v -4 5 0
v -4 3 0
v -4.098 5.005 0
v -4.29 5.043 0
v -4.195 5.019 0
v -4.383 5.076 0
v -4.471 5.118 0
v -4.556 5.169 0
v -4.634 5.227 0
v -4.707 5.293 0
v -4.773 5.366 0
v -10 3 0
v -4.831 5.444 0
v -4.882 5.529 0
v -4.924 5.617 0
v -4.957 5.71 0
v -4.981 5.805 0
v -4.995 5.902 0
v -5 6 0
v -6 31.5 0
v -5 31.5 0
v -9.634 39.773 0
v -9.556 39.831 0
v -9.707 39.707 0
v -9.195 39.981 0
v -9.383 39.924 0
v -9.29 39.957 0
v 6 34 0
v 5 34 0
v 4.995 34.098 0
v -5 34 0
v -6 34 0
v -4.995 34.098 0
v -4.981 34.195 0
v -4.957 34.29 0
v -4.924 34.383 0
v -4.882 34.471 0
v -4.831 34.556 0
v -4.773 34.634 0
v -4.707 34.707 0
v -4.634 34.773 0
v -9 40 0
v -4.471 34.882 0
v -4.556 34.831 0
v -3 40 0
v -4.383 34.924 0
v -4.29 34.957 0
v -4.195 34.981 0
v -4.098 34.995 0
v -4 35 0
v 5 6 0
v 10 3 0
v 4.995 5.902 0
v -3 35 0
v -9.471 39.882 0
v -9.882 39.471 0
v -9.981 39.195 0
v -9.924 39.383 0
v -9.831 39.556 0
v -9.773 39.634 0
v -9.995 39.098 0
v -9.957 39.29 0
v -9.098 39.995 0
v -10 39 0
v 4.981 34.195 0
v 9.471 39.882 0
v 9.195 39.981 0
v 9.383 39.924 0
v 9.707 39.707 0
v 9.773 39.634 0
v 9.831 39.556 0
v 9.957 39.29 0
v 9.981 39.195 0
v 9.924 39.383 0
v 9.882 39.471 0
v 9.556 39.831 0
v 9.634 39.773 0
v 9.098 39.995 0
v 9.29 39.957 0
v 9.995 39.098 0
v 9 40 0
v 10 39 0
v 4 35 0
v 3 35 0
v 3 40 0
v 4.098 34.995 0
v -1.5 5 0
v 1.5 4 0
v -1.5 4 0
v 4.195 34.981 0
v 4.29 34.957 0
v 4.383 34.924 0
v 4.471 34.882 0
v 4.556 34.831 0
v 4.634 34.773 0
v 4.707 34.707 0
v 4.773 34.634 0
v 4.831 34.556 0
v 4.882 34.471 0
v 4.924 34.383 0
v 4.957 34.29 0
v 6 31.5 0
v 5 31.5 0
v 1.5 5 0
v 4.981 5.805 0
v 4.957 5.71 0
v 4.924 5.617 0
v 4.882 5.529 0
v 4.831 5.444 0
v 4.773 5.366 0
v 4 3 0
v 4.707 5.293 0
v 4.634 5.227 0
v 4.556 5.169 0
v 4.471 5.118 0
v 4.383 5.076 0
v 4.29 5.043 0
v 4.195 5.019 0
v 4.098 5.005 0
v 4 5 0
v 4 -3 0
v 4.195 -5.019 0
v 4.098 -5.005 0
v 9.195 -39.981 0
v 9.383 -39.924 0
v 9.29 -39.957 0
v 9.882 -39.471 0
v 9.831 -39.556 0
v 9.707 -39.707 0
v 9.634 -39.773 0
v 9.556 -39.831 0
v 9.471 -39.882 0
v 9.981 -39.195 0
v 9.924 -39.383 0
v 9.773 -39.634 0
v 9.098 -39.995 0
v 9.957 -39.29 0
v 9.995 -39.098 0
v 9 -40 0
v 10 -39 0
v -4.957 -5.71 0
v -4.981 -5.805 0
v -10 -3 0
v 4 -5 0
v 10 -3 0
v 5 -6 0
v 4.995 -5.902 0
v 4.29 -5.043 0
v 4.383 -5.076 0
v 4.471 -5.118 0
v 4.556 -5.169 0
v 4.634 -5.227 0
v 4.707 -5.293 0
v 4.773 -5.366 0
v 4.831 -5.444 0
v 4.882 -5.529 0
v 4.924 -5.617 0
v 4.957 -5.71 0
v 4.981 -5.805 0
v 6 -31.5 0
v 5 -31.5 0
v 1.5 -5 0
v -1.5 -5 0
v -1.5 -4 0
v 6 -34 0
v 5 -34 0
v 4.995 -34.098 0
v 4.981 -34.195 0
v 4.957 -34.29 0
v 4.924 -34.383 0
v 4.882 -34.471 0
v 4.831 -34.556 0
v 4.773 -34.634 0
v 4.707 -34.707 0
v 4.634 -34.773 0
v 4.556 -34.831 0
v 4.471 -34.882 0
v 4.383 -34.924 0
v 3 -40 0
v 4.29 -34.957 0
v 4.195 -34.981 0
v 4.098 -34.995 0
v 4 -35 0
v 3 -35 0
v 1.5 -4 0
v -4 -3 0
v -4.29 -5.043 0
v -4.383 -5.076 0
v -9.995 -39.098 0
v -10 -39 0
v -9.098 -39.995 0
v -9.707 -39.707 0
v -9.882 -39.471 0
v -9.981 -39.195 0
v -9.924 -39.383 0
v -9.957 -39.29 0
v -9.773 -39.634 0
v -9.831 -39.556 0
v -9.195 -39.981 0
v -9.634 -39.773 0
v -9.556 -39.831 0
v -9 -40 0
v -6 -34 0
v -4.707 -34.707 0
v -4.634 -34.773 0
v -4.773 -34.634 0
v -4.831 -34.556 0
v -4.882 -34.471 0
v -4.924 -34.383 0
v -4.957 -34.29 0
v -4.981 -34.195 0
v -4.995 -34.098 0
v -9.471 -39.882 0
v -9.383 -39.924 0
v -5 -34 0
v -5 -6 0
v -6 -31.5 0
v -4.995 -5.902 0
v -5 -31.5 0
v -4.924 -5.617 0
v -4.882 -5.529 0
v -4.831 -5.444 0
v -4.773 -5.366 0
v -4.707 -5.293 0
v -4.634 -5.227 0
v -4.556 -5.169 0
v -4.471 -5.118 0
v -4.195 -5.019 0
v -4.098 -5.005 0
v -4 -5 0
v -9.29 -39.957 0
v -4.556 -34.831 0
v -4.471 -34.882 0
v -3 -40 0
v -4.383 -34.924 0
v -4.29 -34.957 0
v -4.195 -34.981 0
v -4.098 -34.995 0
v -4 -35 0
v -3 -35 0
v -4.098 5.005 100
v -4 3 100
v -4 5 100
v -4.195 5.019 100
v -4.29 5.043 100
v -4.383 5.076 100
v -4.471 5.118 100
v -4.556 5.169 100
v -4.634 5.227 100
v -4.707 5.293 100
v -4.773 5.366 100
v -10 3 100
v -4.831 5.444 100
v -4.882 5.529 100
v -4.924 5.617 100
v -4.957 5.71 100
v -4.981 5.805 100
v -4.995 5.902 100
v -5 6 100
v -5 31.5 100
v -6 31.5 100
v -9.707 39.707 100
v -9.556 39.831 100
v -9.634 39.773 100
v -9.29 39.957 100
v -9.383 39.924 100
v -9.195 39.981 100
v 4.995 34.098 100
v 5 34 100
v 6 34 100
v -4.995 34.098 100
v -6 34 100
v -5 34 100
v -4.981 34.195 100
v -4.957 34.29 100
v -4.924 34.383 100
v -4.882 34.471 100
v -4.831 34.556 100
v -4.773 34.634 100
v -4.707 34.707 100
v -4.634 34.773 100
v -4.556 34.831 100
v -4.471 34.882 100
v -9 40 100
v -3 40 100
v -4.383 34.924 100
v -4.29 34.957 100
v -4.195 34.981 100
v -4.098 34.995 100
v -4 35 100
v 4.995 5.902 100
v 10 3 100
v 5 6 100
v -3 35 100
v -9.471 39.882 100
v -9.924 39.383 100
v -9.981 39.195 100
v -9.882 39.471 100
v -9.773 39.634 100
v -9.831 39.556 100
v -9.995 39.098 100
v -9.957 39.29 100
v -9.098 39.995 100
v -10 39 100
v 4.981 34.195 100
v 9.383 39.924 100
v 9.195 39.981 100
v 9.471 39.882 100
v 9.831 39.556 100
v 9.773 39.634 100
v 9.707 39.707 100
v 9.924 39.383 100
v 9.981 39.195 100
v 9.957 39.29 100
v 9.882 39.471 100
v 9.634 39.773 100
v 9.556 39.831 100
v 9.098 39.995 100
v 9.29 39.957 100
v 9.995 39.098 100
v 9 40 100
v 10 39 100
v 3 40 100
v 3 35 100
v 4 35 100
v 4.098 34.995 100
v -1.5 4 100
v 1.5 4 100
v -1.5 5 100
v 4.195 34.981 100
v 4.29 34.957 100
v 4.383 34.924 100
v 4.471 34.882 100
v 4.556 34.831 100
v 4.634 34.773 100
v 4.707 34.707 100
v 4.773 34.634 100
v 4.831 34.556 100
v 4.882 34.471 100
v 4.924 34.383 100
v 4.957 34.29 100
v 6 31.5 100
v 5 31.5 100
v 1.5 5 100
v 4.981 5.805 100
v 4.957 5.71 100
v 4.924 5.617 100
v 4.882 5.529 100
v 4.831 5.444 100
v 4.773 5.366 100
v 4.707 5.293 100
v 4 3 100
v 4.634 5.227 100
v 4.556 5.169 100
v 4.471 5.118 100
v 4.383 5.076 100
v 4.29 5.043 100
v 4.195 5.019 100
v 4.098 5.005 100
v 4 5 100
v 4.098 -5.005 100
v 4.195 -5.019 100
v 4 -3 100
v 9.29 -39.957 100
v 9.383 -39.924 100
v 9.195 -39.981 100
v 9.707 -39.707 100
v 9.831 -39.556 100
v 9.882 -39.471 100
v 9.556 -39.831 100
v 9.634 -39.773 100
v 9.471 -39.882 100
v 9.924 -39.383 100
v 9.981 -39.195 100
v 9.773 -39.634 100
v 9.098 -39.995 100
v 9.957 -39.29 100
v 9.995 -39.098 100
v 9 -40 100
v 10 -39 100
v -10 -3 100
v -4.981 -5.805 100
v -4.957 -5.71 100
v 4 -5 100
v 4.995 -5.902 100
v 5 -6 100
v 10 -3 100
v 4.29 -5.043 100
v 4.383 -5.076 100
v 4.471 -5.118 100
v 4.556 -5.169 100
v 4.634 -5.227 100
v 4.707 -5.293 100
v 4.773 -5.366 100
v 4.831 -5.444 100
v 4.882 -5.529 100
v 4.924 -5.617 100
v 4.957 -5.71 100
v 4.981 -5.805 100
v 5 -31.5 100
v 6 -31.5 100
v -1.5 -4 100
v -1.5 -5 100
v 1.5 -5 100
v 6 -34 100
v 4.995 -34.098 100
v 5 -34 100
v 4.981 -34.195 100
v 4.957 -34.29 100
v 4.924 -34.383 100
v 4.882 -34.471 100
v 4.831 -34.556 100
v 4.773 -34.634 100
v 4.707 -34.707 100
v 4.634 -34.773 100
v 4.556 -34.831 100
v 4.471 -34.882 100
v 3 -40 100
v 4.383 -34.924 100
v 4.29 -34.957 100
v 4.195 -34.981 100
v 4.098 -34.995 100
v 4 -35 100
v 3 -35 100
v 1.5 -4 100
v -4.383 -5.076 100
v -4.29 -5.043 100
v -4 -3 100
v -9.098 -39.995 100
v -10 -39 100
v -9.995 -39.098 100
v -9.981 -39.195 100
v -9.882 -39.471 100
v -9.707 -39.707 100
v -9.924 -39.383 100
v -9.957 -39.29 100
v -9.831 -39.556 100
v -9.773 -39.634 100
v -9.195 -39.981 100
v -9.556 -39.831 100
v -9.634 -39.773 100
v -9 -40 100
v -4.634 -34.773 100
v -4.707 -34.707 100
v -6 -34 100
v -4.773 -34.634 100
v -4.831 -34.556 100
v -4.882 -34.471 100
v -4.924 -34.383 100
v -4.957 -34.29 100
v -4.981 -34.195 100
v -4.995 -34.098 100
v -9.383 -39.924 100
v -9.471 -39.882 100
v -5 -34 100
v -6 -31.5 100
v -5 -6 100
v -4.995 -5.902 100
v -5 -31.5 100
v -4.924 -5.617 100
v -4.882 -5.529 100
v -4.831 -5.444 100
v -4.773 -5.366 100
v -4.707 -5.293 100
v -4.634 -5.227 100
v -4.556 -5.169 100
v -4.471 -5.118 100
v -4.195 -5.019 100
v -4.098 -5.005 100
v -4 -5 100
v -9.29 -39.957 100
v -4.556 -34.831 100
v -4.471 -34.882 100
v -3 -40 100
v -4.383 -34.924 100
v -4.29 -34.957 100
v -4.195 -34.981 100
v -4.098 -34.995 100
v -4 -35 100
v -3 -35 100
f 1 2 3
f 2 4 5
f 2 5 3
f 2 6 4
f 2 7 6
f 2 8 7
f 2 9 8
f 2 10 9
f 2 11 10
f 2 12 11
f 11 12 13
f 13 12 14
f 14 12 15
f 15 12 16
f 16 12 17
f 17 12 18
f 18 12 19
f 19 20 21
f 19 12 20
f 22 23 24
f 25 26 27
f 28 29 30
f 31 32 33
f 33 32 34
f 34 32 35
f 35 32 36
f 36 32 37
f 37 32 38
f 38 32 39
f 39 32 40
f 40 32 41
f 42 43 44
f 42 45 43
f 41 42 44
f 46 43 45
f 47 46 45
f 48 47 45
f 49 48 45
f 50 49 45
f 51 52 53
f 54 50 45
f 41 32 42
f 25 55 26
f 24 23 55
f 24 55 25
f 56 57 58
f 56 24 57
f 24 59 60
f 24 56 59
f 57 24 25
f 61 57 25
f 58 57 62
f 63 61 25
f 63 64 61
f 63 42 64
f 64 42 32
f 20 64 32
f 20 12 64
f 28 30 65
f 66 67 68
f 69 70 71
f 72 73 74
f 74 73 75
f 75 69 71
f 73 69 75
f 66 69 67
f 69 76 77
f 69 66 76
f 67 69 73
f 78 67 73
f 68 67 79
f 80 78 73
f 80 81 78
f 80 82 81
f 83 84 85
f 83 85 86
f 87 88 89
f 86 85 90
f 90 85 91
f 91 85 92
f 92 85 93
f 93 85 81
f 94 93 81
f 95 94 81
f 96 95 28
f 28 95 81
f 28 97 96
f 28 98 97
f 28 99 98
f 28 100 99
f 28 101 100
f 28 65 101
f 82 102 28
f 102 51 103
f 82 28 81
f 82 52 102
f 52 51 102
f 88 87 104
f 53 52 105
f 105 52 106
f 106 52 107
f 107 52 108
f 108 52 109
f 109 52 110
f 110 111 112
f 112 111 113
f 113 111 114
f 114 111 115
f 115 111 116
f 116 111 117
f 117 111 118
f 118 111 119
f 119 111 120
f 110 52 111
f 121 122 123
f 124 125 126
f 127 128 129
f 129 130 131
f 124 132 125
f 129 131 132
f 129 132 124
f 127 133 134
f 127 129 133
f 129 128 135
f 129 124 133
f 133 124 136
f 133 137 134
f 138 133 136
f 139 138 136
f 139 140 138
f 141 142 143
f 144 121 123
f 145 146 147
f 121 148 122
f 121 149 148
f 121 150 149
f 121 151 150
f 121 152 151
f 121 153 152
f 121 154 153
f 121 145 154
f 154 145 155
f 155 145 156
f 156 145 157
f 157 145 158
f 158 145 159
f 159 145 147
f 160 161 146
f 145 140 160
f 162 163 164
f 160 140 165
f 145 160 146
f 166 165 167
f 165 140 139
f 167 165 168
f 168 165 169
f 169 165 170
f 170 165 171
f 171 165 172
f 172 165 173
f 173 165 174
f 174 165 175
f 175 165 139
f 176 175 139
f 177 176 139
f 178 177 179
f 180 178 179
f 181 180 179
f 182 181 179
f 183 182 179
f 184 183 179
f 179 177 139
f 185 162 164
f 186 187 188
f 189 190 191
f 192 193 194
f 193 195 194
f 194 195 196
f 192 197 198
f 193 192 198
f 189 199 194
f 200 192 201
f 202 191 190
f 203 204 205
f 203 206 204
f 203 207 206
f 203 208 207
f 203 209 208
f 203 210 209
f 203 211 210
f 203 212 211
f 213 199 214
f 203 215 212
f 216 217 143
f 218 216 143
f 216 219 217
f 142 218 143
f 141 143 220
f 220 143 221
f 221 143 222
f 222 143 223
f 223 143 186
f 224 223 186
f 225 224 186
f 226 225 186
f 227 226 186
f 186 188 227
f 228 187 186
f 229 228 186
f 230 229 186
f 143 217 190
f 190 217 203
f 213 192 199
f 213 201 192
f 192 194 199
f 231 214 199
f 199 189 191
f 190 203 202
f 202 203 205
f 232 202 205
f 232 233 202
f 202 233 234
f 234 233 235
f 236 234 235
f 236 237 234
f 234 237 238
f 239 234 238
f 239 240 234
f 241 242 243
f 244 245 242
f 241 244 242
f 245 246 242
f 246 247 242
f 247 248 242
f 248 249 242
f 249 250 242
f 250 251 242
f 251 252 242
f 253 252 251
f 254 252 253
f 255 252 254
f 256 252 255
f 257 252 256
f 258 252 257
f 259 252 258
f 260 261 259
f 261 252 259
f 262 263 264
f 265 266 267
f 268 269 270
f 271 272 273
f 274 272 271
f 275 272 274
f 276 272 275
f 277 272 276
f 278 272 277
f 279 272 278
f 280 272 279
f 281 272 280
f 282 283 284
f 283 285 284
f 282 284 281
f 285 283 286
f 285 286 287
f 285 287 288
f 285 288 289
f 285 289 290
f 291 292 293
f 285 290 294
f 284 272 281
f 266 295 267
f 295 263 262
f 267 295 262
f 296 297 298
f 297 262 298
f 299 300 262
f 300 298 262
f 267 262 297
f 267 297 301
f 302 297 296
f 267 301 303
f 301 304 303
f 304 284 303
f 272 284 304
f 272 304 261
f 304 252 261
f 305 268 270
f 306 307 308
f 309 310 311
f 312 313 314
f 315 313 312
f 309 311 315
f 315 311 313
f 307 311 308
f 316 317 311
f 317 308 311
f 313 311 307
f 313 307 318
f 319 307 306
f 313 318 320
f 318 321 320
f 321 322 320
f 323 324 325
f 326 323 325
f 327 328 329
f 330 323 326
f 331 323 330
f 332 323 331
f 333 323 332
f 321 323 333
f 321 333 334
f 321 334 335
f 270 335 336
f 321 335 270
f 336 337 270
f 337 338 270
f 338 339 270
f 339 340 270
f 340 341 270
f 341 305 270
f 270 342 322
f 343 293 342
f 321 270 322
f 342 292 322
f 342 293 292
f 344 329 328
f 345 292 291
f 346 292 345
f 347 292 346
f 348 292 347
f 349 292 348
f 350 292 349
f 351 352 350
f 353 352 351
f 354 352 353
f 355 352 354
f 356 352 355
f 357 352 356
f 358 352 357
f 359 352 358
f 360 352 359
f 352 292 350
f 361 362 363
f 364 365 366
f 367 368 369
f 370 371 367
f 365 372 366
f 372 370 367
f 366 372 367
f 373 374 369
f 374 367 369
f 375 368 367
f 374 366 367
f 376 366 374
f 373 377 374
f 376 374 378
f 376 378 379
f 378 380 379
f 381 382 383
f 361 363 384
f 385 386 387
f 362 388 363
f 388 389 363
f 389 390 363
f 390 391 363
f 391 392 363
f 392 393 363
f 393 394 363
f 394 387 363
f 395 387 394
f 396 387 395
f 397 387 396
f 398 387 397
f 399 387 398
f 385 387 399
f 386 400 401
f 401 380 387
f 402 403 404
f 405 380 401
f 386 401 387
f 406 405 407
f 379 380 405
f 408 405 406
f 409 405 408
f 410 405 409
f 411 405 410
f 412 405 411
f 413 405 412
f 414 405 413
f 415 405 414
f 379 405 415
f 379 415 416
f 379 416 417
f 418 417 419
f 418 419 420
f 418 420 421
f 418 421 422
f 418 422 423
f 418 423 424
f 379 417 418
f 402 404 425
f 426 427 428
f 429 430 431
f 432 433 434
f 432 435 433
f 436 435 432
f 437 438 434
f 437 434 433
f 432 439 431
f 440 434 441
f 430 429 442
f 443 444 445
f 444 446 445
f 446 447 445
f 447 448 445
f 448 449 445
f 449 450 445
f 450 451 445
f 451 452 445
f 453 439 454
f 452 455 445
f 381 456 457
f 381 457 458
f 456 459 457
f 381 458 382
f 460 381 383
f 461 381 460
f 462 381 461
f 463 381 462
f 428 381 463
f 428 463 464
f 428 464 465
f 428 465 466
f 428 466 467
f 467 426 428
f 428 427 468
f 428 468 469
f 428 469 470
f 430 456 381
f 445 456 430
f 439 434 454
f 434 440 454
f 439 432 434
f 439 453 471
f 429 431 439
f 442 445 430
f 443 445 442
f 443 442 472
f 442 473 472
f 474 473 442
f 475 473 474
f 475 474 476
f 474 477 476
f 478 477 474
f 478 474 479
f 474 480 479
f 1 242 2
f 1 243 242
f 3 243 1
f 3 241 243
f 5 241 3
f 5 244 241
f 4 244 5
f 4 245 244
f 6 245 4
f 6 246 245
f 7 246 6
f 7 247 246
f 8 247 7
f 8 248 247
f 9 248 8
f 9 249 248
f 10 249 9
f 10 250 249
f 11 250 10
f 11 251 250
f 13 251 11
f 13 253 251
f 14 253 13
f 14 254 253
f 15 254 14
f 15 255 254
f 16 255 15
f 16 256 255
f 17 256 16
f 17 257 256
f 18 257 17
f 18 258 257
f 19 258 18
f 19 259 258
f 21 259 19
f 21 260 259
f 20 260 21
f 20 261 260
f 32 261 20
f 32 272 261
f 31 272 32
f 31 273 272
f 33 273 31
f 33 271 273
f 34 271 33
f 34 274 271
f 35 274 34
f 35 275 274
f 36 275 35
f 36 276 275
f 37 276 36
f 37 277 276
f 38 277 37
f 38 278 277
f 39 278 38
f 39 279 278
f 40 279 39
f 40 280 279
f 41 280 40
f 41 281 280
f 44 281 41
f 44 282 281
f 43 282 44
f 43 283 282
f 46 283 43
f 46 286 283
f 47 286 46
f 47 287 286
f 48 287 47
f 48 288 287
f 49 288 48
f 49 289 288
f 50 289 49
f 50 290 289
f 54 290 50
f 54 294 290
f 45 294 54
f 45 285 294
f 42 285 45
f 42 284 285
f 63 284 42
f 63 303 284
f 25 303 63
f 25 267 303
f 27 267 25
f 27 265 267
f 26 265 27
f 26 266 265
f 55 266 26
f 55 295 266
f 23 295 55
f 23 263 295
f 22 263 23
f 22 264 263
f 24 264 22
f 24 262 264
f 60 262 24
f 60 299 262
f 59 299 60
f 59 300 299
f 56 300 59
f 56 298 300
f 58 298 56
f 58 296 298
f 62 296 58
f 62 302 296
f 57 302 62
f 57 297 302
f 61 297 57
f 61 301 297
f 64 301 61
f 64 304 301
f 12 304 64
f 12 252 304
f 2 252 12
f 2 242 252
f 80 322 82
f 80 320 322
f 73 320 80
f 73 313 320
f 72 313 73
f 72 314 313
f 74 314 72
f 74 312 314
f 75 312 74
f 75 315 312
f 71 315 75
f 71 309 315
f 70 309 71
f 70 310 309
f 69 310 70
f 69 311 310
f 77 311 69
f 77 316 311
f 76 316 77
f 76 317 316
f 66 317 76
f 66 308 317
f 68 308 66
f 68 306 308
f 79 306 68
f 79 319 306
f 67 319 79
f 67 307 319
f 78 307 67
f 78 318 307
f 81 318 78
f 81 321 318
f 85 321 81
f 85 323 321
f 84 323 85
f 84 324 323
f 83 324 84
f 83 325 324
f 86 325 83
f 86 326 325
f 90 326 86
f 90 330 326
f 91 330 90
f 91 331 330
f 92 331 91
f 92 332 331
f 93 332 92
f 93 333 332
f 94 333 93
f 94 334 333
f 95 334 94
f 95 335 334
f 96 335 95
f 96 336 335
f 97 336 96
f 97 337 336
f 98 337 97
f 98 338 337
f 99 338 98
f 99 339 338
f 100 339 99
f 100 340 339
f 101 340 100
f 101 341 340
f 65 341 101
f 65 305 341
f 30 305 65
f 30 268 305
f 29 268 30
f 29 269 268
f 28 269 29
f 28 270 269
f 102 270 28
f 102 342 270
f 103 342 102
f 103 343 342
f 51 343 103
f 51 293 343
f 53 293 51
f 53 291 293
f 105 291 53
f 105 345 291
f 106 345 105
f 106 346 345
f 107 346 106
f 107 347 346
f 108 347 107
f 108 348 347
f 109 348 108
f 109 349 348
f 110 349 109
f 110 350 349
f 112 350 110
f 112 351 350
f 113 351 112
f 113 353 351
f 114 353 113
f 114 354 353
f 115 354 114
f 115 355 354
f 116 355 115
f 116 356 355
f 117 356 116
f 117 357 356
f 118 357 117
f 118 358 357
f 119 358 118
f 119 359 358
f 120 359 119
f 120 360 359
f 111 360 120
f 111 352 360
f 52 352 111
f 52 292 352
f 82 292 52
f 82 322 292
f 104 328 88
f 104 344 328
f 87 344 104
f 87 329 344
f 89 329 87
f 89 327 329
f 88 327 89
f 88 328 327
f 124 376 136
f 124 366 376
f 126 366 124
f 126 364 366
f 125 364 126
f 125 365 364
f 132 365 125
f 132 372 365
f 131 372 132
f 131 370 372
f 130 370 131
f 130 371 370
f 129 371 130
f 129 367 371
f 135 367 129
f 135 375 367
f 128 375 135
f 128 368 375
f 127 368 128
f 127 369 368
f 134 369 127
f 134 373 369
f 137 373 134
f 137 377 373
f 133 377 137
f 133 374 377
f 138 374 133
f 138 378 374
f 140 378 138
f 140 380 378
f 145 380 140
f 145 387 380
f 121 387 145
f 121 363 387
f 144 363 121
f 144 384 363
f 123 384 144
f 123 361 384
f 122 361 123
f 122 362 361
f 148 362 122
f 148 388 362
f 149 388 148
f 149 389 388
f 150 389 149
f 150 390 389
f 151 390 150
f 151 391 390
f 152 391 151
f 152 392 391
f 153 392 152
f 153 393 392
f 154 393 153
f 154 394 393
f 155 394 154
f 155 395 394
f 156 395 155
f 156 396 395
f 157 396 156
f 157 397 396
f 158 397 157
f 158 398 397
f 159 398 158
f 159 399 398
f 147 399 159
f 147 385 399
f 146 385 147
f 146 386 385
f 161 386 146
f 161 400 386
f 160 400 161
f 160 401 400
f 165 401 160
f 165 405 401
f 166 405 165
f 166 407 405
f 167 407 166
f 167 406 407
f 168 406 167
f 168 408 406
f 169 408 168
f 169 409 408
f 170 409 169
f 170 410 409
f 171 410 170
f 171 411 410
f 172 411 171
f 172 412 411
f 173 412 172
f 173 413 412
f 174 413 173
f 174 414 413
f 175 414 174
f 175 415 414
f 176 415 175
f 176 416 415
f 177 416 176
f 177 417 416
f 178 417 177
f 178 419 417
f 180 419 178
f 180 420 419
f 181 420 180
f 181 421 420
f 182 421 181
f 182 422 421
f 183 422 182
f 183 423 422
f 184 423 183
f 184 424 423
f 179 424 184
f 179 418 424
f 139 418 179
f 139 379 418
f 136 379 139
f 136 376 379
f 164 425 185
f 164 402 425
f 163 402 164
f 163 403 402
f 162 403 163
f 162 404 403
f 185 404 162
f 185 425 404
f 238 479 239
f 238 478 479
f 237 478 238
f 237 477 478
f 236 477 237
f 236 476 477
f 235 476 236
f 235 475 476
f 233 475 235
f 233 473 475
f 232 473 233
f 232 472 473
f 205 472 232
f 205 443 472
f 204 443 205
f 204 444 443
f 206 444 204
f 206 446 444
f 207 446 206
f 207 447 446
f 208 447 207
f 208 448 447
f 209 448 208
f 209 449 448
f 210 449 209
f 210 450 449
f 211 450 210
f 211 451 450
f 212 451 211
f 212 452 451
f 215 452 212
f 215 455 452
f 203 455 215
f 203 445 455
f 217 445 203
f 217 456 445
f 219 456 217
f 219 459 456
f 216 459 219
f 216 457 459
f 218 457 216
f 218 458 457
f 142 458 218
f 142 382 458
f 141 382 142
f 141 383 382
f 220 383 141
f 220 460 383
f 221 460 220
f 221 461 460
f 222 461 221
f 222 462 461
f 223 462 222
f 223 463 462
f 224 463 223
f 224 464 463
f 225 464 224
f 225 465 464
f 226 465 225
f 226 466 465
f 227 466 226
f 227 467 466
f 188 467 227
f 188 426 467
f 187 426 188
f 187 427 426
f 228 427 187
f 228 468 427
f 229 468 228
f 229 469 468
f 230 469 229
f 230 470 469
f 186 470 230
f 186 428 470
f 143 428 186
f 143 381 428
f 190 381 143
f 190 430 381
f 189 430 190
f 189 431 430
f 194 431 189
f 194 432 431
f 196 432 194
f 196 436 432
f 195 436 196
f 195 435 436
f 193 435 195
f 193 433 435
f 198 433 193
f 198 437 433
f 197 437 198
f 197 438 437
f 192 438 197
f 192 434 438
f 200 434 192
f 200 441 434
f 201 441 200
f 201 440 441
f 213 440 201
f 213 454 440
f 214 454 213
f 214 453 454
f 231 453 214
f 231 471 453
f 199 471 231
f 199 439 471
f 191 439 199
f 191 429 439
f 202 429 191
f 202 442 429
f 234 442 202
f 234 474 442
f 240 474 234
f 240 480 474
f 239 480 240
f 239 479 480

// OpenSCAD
$fn = 64;

// 20x80 aluminum extrusion-like profile (simplified), 100mm long
// Cross-section: 20.0mm x 80.0mm, with 4 longitudinal T-slots and a central bore.

length = 100;

w = 20;
h = 80;

// Outer corner radius (approx)
r_outer = 1.0;

// Central bore
bore_d = 5.2;

// Slot parameters (approx, for a typical T-slot look)
slot_open = 6.0;     // opening at surface
slot_neck = 8.0;     // neck width inside
slot_head = 12.0;    // undercut width
slot_depth = 6.0;    // depth from surface to head
slot_head_depth = 2.5; // additional depth for head undercut

// Internal lightening pockets (approx)
pocket_w = 10.0;
pocket_h = 30.0;
pocket_r = 1.0;

module rounded_rect_2d(W, H, R){
    R = min(R, W/2, H/2);
    hull(){
        translate([ W/2-R,  H/2-R]) circle(r=R);
        translate([-W/2+R,  H/2-R]) circle(r=R);
        translate([-W/2+R, -H/2+R]) circle(r=R);
        translate([ W/2-R, -H/2+R]) circle(r=R);
    }
}

module tslot_cut_2d(W, H, side="top"){
    // Creates a T-slot cut profile on one side of the rectangle.
    // side: "top","bottom","left","right"
    // Coordinates centered at origin.
    if (side == "top"){
        translate([0, H/2 - slot_depth/2])
            square([slot_open, slot_depth], center=true);
        translate([0, H/2 - slot_depth - slot_head_depth/2])
            square([slot_head, slot_head_depth], center=true);
        translate([0, H/2 - slot_depth - slot_head_depth - 2.0])
            square([slot_neck, 4.0], center=true);
    } else if (side == "bottom"){
        mirror([0,1,0]) tslot_cut_2d(W,H,"top");
    } else if (side == "left"){
        rotate(90) tslot_cut_2d(H,W,"top");
    } else if (side == "right"){
        rotate(-90) tslot_cut_2d(H,W,"top");
    }
}

module pocket_2d(cx, cy, pw, ph, pr){
    translate([cx, cy]) rounded_rect_2d(pw, ph, pr);
}

module profile_2d(){
    difference(){
        // Outer body
        rounded_rect_2d(w, h, r_outer);

        // Central bore
        circle(d=bore_d);

        // Four T-slots
        tslot_cut_2d(w,h,"top");
        tslot_cut_2d(w,h,"bottom");
        tslot_cut_2d(w,h,"left");
        tslot_cut_2d(w,h,"right");

        // Internal pockets (approximate)
        pocket_2d(0,  20, pocket_w, pocket_h, pocket_r);
        pocket_2d(0, -20, pocket_w, pocket_h, pocket_r);
    }
}

linear_extrude(height=length, center=false, convexity=10)
    profile_2d();
